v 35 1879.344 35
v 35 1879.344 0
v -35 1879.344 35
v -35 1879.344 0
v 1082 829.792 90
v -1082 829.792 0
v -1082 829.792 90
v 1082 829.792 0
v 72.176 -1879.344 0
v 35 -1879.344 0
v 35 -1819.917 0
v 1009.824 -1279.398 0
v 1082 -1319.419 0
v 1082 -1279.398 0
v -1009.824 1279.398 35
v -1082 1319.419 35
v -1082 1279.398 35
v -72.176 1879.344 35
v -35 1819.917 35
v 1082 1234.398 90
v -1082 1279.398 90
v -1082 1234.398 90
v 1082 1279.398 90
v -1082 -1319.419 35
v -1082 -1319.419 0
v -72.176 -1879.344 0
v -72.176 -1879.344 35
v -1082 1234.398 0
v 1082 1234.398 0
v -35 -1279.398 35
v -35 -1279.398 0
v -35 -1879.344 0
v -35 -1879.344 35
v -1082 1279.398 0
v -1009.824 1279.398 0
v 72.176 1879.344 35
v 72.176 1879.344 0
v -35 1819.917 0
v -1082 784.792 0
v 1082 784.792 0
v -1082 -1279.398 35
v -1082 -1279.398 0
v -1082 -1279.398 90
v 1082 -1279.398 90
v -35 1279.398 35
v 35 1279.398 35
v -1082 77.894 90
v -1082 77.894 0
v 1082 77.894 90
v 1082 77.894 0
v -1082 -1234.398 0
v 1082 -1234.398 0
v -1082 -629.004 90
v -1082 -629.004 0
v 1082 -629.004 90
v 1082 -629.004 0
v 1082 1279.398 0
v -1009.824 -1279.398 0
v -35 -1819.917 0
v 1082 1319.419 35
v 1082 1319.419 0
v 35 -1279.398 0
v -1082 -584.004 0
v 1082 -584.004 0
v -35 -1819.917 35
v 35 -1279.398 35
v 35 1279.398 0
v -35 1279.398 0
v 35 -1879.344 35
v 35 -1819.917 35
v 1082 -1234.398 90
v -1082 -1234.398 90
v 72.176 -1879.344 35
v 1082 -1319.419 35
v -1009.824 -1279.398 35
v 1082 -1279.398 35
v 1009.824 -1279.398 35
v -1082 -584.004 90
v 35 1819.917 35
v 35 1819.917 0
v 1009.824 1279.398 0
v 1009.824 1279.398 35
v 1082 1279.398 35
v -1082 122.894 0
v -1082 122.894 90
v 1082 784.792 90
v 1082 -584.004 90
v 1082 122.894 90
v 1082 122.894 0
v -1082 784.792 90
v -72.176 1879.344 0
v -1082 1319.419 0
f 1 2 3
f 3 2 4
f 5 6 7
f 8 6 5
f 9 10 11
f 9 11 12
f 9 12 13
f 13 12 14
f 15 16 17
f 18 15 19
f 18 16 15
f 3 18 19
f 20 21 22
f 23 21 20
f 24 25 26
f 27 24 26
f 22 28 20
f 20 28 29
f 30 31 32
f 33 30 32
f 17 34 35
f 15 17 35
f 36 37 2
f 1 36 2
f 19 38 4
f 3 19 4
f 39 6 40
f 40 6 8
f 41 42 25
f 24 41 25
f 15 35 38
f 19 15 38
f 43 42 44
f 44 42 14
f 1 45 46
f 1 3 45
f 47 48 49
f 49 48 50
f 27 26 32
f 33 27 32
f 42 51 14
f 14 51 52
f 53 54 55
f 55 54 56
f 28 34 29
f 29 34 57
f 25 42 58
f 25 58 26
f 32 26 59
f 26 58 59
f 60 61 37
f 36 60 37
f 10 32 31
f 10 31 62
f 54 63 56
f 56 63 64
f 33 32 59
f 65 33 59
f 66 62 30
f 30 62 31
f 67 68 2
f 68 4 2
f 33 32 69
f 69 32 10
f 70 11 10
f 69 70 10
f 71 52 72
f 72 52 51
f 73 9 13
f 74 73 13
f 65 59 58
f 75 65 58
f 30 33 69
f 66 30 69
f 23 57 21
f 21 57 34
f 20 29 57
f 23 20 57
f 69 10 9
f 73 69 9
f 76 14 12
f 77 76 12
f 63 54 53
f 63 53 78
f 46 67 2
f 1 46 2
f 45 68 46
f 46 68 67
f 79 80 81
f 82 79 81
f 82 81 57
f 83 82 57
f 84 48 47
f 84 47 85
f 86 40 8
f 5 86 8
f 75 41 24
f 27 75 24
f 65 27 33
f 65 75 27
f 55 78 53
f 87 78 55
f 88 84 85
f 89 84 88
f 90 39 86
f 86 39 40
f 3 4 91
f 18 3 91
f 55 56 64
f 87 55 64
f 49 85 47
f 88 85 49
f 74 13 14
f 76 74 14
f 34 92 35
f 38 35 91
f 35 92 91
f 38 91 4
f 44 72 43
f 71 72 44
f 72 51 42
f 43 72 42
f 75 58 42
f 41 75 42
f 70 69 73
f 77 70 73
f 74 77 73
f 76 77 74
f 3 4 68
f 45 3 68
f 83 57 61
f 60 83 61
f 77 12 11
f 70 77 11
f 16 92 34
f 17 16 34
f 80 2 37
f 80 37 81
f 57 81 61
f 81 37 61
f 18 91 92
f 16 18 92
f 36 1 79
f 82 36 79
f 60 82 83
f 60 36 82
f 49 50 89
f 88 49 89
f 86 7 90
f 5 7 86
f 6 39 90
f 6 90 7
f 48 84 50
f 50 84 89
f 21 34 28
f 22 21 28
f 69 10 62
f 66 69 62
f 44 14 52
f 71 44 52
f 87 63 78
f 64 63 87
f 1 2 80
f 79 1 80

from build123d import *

# Parameters (mm, degrees)
F0_W     = 2164
F0_H     = 45
F1_DEPTH = 90
F2_DEPTH = 35
F3_DEPTH = 35


with BuildPart() as f1:
    # F0 (on Top) → F1 (new body)
    with BuildSketch(Plane.XY):
        Polygon((-1009.823521, 1279.3985), (-1082, 1279.3985), (-1082, 1234.3985), (1082, 1234.3985), (1082, 1279.3985), (1009.823521, 1279.3985), (35, 1279.3985), (-35, 1279.3985), align=None)
        with Locations((0, 807.2925)):
            Rectangle(F0_W, F0_H)
        with Locations((0, 100.3945)):
            Rectangle(F0_W, F0_H)
        with Locations((0, -606.5035)):
            Rectangle(F0_W, F0_H)
        Polygon((1082, -1234.3985), (-1082, -1234.3985), (-1082, -1279.3985), (-1009.823521, -1279.3985), (-35, -1279.3985), (35, -1279.3985), (1009.823521, -1279.3985), (1082, -1279.3985), align=None)
    extrude(amount=F1_DEPTH)


with BuildPart() as f2:
    # F0 (on Top) → F2 (new body)
    with BuildSketch(Plane.XY):
        Polygon((-1082, 1319.418756), (-1082, 1279.3985), (-1009.823521, 1279.3985), (-35, 1819.91652), (-35, 1879.3435), (-72.176479, 1879.3435), align=None)
        Polygon((1009.823521, 1279.3985), (1082, 1279.3985), (1082, 1319.418756), (72.176479, 1879.3435), (35, 1879.3435), (35, 1819.91652), align=None)
        Polygon((-1009.823521, -1279.3985), (-1082, -1279.3985), (-1082, -1319.418756), (-72.176479, -1879.3435), (-35, -1879.3435), (-35, -1819.91652), align=None)
        Polygon((1082, -1319.418756), (1082, -1279.3985), (1009.823521, -1279.3985), (35, -1819.91652), (35, -1879.3435), (72.176479, -1879.3435), align=None)
    extrude(amount=F2_DEPTH)


with BuildPart() as f3:
    # F0 (on Top) → F3 (new body)
    with BuildSketch(Plane.XY):
        Polygon((-35, 1819.91652), (-35, 1279.3985), (35, 1279.3985), (35, 1819.91652), (35, 1879.3435), (-35, 1879.3435), align=None)
        Polygon((35, -1279.3985), (-35, -1279.3985), (-35, -1819.91652), (-35, -1879.3435), (35, -1879.3435), (35, -1819.91652), align=None)
    extrude(amount=F3_DEPTH)


solid = Compound([f1.part, f2.part, f3.part])
